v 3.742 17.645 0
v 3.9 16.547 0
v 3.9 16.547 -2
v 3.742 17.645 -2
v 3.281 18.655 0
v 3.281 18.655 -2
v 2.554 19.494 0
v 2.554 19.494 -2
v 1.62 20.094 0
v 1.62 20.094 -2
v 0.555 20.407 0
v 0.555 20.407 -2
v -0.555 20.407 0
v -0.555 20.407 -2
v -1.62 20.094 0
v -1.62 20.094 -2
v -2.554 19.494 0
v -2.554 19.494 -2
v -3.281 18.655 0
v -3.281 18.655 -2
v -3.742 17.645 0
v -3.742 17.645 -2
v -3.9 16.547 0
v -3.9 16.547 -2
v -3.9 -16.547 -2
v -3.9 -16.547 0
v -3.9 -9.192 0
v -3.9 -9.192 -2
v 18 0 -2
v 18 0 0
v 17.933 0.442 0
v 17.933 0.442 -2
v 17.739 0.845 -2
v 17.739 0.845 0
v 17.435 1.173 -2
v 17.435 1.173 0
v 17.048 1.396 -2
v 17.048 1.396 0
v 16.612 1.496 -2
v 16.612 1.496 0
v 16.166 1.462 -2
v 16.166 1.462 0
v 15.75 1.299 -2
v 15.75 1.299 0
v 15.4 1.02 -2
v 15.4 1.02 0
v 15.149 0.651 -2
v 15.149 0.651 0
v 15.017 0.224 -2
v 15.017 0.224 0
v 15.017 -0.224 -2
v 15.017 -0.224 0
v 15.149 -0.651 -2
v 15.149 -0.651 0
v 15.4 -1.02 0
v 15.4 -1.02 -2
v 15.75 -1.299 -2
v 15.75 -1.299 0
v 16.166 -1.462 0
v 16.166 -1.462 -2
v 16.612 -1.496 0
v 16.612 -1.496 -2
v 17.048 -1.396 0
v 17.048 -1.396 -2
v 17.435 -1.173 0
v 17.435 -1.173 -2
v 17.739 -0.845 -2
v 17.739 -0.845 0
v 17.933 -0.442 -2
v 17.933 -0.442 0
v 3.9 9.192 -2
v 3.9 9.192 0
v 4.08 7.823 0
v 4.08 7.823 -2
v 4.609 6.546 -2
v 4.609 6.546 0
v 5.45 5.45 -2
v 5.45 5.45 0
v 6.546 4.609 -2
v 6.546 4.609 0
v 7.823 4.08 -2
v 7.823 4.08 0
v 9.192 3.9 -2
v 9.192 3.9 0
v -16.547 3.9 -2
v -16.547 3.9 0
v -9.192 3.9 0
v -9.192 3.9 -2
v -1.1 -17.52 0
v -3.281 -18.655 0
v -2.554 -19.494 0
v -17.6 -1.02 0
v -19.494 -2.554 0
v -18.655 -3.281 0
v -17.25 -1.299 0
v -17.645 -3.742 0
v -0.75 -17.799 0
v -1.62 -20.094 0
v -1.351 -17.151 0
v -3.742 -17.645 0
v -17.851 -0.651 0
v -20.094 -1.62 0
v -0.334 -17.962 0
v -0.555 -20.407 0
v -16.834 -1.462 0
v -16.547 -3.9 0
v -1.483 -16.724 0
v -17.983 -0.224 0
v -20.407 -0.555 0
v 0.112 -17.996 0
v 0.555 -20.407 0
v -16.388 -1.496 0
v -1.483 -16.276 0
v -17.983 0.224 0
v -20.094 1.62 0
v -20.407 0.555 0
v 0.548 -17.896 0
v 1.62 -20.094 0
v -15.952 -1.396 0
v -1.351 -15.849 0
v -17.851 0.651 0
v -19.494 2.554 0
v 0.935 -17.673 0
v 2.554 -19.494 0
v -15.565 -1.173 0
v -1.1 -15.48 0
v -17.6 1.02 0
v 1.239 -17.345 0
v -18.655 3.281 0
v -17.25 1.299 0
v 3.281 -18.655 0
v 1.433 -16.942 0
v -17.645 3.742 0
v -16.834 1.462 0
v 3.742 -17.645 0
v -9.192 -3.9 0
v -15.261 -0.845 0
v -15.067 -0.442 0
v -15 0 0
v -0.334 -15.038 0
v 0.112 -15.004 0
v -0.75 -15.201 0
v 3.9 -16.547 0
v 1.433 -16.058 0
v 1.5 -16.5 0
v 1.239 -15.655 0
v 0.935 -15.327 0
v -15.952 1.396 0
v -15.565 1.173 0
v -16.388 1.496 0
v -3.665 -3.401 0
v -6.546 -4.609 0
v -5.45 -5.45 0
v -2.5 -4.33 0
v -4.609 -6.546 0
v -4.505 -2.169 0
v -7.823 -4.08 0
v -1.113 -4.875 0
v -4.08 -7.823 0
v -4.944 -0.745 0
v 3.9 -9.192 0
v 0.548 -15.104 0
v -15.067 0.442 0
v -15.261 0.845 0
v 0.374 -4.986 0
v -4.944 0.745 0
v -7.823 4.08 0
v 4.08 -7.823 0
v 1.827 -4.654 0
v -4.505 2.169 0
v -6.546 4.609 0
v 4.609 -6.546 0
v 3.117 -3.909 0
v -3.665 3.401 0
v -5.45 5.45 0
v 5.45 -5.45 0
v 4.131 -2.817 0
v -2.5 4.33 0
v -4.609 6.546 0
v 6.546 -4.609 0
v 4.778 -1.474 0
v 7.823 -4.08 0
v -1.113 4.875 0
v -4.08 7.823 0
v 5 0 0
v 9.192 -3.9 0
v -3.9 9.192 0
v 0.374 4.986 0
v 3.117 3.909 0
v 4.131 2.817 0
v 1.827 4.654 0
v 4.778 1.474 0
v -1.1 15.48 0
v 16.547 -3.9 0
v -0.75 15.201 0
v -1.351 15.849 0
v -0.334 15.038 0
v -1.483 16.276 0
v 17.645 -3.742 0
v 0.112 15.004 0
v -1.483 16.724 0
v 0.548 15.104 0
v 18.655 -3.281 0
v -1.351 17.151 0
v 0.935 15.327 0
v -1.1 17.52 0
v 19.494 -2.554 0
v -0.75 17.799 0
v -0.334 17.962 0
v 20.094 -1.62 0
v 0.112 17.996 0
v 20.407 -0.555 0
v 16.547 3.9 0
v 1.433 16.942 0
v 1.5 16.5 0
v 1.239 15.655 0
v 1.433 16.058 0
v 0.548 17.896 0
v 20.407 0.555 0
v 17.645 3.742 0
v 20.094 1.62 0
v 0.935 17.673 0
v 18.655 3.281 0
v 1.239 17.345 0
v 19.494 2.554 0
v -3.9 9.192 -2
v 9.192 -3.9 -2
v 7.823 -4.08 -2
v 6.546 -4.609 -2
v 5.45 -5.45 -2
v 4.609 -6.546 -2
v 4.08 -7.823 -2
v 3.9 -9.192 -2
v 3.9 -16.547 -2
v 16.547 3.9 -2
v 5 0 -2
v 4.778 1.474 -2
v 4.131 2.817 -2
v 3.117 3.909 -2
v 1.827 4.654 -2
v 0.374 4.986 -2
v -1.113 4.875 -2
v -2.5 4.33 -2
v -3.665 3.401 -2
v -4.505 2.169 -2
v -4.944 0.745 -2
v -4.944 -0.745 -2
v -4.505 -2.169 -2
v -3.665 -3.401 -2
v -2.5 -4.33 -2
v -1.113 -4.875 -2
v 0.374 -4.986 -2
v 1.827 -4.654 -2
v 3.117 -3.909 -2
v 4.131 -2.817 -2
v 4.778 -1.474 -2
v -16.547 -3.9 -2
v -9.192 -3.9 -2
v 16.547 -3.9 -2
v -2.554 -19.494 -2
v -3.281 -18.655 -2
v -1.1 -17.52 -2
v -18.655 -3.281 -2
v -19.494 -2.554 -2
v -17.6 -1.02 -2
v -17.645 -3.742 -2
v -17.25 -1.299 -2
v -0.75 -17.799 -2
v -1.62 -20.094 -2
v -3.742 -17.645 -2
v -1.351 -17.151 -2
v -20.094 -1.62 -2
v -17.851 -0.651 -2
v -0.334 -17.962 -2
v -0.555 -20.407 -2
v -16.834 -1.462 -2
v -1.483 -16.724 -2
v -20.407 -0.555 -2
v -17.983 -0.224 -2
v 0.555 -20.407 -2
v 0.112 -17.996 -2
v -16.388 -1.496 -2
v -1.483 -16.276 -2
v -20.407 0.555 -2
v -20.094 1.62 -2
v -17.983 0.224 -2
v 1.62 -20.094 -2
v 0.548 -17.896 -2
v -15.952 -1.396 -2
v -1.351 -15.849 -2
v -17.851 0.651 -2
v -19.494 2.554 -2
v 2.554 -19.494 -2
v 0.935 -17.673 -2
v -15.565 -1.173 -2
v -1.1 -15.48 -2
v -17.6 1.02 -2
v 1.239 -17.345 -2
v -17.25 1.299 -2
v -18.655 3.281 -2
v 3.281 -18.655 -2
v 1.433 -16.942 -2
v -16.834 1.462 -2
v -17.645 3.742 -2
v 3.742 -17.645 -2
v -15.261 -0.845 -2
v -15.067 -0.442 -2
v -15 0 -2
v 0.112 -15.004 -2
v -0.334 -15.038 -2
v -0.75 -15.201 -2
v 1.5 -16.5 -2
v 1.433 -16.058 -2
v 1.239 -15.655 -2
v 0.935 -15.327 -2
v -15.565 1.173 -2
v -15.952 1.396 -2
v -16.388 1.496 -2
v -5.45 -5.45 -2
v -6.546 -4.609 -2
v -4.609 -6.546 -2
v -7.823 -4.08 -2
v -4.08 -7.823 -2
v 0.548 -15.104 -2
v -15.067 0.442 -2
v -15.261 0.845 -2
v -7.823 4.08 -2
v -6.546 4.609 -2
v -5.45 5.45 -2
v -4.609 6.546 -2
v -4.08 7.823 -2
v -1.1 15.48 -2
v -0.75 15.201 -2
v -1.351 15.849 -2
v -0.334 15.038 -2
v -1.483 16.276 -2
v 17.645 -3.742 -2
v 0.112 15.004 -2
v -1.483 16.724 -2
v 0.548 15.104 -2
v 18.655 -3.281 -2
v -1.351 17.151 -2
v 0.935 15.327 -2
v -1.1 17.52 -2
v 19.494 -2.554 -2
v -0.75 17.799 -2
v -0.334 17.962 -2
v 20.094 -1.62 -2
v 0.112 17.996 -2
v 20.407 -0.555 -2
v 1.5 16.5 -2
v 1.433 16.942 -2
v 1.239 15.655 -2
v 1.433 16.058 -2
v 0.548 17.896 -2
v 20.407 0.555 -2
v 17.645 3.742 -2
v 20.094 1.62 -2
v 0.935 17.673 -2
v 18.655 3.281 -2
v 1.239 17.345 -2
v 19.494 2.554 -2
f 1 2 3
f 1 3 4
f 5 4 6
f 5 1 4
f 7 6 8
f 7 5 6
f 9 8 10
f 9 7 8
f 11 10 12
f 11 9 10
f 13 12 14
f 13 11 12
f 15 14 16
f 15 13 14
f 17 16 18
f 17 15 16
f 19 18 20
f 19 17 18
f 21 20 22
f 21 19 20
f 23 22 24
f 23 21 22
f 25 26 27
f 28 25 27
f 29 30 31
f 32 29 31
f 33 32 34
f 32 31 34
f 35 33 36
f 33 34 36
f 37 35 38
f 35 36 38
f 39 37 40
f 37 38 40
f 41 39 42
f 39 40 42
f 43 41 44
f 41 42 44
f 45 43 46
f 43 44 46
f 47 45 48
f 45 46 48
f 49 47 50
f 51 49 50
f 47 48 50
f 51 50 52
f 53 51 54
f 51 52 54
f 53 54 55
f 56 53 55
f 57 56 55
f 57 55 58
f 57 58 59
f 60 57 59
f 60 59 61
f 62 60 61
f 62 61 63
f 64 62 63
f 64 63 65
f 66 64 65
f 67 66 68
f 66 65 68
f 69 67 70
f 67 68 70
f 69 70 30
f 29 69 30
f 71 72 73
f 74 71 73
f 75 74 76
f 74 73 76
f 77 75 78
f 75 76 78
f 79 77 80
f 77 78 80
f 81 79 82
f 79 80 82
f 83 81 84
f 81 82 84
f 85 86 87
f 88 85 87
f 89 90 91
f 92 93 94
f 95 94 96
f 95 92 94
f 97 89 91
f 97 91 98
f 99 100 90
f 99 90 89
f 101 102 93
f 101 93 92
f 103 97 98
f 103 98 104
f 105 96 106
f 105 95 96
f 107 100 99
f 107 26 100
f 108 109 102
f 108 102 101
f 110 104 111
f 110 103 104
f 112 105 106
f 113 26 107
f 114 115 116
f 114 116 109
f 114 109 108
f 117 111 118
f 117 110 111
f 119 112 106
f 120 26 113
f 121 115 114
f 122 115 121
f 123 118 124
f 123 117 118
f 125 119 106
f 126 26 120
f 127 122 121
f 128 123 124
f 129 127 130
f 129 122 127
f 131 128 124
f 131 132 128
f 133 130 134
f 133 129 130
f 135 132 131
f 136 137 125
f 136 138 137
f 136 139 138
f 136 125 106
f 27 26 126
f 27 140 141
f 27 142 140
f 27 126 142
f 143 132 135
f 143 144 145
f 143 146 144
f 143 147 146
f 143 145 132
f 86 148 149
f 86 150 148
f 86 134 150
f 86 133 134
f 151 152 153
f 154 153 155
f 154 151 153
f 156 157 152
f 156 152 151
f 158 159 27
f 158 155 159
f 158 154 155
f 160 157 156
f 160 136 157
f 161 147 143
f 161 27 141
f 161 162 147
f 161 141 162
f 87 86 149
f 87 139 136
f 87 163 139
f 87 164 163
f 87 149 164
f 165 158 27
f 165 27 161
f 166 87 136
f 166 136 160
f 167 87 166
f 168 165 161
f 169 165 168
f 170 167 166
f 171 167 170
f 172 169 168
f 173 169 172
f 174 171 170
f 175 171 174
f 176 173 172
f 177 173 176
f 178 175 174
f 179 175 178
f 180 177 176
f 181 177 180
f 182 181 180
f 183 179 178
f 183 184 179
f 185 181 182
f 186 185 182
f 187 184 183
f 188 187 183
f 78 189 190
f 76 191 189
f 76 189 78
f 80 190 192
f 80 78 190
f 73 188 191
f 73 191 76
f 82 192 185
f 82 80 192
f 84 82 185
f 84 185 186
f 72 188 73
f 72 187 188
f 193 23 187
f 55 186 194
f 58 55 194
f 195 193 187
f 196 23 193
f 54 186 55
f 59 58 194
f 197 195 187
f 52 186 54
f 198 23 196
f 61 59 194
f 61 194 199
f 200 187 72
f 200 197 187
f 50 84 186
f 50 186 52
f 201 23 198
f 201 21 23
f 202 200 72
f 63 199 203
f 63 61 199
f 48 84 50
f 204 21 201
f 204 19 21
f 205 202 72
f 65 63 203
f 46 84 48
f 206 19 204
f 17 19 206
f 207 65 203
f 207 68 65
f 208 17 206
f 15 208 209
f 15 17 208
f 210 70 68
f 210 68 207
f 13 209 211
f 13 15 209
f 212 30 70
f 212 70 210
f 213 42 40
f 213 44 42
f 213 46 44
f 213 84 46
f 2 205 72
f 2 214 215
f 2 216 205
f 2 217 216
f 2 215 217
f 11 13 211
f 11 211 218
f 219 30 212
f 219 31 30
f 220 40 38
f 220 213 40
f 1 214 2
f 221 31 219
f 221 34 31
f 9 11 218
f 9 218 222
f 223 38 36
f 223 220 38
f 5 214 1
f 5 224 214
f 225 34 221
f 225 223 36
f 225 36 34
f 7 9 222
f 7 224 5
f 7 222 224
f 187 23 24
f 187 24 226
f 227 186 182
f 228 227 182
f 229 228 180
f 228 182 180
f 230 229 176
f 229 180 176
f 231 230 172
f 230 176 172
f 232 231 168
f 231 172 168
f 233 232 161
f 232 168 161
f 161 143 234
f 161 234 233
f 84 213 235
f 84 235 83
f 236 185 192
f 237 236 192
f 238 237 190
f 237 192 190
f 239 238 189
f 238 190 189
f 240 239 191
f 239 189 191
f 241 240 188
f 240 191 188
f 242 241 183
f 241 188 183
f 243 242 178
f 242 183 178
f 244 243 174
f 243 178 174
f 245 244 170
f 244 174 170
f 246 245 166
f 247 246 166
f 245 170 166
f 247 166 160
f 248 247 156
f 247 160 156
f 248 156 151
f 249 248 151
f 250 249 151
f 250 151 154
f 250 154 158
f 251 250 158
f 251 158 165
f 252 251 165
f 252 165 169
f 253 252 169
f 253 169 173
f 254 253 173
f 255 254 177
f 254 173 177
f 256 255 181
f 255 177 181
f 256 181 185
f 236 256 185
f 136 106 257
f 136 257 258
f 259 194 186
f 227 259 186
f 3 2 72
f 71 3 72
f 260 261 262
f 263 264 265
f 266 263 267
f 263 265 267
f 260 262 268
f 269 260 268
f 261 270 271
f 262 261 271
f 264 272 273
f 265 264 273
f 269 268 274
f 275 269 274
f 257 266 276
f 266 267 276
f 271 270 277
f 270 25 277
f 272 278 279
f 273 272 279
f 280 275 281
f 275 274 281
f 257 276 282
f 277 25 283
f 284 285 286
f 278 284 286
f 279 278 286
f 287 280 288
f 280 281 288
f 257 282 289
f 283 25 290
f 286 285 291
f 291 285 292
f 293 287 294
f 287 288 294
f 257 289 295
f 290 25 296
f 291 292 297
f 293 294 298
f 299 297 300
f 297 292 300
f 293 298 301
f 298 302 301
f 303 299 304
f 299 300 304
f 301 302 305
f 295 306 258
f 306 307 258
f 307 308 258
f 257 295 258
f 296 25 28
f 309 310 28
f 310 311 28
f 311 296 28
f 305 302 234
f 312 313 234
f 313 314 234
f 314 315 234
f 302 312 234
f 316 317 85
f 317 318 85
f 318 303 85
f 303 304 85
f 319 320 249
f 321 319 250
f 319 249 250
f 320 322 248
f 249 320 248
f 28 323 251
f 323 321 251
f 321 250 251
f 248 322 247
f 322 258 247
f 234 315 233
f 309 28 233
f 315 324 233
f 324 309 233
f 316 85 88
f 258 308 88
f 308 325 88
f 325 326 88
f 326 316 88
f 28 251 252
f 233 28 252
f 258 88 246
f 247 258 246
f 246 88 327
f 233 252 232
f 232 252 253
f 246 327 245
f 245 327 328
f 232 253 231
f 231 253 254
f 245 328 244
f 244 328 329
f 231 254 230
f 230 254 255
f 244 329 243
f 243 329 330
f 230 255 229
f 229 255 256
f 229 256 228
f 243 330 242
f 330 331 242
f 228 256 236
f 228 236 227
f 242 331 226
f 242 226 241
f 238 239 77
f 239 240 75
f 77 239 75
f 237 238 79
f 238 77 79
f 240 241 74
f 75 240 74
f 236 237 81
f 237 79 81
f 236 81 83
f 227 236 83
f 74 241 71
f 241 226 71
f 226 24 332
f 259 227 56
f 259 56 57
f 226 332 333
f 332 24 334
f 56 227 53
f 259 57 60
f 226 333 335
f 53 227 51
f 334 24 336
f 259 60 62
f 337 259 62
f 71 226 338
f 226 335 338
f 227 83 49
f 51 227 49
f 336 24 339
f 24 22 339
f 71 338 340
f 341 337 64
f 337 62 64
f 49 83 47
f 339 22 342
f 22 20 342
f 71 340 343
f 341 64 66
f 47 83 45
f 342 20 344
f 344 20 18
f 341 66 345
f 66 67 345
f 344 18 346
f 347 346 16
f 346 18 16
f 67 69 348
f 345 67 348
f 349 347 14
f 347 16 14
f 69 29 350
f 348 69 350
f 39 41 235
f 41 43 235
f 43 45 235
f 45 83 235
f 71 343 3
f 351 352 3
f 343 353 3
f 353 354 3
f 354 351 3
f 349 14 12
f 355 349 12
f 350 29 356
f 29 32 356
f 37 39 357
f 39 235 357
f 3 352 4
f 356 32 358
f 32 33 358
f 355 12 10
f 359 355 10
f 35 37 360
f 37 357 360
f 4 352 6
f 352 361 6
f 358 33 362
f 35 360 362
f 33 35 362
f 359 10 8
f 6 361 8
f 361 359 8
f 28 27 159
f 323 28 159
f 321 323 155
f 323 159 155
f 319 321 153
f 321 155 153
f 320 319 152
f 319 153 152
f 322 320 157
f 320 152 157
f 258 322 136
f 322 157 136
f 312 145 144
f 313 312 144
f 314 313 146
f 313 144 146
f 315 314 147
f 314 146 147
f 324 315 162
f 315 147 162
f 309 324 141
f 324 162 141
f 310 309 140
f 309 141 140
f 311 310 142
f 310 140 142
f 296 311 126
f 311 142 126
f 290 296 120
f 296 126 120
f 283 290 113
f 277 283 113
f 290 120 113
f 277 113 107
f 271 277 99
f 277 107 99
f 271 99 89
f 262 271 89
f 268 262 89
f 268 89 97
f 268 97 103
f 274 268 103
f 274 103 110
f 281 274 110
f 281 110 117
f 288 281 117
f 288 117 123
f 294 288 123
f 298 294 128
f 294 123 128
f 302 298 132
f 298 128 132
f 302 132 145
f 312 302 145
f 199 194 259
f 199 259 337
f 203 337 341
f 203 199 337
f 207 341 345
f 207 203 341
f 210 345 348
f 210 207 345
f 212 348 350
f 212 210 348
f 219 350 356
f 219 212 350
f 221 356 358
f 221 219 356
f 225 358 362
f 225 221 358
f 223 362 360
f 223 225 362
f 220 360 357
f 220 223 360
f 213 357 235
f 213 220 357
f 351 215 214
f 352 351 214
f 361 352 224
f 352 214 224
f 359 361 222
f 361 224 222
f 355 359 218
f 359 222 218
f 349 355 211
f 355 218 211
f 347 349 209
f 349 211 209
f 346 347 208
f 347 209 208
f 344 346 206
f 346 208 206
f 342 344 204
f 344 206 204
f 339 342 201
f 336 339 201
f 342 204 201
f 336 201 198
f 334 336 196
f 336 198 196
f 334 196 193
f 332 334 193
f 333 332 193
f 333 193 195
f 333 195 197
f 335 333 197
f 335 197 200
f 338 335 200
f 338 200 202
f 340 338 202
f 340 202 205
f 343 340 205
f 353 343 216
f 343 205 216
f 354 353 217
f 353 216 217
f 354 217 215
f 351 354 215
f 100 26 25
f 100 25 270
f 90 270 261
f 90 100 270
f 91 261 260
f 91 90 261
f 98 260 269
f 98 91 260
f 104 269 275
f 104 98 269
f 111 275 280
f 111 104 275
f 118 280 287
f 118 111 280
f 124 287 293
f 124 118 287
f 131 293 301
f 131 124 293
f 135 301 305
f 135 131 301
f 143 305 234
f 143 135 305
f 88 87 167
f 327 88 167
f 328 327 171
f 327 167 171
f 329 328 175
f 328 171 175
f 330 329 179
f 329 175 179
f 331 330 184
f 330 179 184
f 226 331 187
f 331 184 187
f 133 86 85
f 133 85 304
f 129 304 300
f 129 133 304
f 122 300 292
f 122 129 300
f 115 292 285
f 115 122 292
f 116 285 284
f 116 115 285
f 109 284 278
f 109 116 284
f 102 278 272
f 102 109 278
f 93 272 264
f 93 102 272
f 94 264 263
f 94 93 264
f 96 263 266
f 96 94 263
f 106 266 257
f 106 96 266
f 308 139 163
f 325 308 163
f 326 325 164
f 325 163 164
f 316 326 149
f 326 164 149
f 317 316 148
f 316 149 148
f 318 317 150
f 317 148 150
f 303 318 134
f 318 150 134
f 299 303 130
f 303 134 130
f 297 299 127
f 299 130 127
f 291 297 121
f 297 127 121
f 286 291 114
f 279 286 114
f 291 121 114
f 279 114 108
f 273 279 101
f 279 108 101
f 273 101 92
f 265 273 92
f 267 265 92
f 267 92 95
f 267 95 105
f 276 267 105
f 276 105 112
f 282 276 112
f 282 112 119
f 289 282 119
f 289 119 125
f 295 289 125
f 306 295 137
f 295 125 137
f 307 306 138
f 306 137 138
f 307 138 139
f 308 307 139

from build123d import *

# Parameters (mm, degrees)
SKETCH_R   = 5
SKETCH_R_2 = 1.5
PAD_DEPTH  = 2


with BuildPart() as part:
    # Sketch → Pad (new body)
    with BuildSketch(Plane.XY):
        with BuildLine():
            ThreePointArc((-16.546601, 3.9), (-20.446601, 0), (-16.546601, -3.9))
            Line((-16.546601, -3.9), (-9.192388, -3.9))
            ThreePointArc((-3.9, -9.192388), (-5.450105, -5.450105), (-9.192388, -3.9))
            Line((-3.9, -16.546601), (-3.9, -9.192388))
            ThreePointArc((-3.9, -16.546601), (0, -20.446601), (3.9, -16.546601))
            Line((3.9, -16.546601), (3.9, -9.192388))
            ThreePointArc((9.192388, -3.9), (5.450105, -5.450105), (3.9, -9.192388))
            Line((16.546601, -3.9), (9.192388, -3.9))
            ThreePointArc((16.546601, -3.9), (20.446601, 0), (16.546601, 3.9))
            Line((16.546601, 3.9), (9.192388, 3.9))
            ThreePointArc((3.9, 9.192388), (5.450105, 5.450105), (9.192388, 3.9))
            Line((3.9, 16.546601), (3.9, 9.192388))
            ThreePointArc((3.9, 16.546601), (0, 20.446601), (-3.9, 16.546601))
            Line((-3.9, 16.546601), (-3.9, 9.192388))
            ThreePointArc((-9.192388, 3.9), (-5.450105, 5.450105), (-3.9, 9.192388))
            Line((-16.546601, 3.9), (-9.192388, 3.9))
        make_face()
        Circle(SKETCH_R, mode=Mode.SUBTRACT)
        with Locations((0, 16.5)):
            Circle(SKETCH_R_2, mode=Mode.SUBTRACT)
        with Locations((16.5, 0)):
            Circle(SKETCH_R_2, mode=Mode.SUBTRACT)
        with Locations((0, -16.5)):
            Circle(SKETCH_R_2, mode=Mode.SUBTRACT)
        with Locations((-16.5, 0)):
            Circle(SKETCH_R_2, mode=Mode.SUBTRACT)
    extrude(amount=-PAD_DEPTH)


solid = part.part
